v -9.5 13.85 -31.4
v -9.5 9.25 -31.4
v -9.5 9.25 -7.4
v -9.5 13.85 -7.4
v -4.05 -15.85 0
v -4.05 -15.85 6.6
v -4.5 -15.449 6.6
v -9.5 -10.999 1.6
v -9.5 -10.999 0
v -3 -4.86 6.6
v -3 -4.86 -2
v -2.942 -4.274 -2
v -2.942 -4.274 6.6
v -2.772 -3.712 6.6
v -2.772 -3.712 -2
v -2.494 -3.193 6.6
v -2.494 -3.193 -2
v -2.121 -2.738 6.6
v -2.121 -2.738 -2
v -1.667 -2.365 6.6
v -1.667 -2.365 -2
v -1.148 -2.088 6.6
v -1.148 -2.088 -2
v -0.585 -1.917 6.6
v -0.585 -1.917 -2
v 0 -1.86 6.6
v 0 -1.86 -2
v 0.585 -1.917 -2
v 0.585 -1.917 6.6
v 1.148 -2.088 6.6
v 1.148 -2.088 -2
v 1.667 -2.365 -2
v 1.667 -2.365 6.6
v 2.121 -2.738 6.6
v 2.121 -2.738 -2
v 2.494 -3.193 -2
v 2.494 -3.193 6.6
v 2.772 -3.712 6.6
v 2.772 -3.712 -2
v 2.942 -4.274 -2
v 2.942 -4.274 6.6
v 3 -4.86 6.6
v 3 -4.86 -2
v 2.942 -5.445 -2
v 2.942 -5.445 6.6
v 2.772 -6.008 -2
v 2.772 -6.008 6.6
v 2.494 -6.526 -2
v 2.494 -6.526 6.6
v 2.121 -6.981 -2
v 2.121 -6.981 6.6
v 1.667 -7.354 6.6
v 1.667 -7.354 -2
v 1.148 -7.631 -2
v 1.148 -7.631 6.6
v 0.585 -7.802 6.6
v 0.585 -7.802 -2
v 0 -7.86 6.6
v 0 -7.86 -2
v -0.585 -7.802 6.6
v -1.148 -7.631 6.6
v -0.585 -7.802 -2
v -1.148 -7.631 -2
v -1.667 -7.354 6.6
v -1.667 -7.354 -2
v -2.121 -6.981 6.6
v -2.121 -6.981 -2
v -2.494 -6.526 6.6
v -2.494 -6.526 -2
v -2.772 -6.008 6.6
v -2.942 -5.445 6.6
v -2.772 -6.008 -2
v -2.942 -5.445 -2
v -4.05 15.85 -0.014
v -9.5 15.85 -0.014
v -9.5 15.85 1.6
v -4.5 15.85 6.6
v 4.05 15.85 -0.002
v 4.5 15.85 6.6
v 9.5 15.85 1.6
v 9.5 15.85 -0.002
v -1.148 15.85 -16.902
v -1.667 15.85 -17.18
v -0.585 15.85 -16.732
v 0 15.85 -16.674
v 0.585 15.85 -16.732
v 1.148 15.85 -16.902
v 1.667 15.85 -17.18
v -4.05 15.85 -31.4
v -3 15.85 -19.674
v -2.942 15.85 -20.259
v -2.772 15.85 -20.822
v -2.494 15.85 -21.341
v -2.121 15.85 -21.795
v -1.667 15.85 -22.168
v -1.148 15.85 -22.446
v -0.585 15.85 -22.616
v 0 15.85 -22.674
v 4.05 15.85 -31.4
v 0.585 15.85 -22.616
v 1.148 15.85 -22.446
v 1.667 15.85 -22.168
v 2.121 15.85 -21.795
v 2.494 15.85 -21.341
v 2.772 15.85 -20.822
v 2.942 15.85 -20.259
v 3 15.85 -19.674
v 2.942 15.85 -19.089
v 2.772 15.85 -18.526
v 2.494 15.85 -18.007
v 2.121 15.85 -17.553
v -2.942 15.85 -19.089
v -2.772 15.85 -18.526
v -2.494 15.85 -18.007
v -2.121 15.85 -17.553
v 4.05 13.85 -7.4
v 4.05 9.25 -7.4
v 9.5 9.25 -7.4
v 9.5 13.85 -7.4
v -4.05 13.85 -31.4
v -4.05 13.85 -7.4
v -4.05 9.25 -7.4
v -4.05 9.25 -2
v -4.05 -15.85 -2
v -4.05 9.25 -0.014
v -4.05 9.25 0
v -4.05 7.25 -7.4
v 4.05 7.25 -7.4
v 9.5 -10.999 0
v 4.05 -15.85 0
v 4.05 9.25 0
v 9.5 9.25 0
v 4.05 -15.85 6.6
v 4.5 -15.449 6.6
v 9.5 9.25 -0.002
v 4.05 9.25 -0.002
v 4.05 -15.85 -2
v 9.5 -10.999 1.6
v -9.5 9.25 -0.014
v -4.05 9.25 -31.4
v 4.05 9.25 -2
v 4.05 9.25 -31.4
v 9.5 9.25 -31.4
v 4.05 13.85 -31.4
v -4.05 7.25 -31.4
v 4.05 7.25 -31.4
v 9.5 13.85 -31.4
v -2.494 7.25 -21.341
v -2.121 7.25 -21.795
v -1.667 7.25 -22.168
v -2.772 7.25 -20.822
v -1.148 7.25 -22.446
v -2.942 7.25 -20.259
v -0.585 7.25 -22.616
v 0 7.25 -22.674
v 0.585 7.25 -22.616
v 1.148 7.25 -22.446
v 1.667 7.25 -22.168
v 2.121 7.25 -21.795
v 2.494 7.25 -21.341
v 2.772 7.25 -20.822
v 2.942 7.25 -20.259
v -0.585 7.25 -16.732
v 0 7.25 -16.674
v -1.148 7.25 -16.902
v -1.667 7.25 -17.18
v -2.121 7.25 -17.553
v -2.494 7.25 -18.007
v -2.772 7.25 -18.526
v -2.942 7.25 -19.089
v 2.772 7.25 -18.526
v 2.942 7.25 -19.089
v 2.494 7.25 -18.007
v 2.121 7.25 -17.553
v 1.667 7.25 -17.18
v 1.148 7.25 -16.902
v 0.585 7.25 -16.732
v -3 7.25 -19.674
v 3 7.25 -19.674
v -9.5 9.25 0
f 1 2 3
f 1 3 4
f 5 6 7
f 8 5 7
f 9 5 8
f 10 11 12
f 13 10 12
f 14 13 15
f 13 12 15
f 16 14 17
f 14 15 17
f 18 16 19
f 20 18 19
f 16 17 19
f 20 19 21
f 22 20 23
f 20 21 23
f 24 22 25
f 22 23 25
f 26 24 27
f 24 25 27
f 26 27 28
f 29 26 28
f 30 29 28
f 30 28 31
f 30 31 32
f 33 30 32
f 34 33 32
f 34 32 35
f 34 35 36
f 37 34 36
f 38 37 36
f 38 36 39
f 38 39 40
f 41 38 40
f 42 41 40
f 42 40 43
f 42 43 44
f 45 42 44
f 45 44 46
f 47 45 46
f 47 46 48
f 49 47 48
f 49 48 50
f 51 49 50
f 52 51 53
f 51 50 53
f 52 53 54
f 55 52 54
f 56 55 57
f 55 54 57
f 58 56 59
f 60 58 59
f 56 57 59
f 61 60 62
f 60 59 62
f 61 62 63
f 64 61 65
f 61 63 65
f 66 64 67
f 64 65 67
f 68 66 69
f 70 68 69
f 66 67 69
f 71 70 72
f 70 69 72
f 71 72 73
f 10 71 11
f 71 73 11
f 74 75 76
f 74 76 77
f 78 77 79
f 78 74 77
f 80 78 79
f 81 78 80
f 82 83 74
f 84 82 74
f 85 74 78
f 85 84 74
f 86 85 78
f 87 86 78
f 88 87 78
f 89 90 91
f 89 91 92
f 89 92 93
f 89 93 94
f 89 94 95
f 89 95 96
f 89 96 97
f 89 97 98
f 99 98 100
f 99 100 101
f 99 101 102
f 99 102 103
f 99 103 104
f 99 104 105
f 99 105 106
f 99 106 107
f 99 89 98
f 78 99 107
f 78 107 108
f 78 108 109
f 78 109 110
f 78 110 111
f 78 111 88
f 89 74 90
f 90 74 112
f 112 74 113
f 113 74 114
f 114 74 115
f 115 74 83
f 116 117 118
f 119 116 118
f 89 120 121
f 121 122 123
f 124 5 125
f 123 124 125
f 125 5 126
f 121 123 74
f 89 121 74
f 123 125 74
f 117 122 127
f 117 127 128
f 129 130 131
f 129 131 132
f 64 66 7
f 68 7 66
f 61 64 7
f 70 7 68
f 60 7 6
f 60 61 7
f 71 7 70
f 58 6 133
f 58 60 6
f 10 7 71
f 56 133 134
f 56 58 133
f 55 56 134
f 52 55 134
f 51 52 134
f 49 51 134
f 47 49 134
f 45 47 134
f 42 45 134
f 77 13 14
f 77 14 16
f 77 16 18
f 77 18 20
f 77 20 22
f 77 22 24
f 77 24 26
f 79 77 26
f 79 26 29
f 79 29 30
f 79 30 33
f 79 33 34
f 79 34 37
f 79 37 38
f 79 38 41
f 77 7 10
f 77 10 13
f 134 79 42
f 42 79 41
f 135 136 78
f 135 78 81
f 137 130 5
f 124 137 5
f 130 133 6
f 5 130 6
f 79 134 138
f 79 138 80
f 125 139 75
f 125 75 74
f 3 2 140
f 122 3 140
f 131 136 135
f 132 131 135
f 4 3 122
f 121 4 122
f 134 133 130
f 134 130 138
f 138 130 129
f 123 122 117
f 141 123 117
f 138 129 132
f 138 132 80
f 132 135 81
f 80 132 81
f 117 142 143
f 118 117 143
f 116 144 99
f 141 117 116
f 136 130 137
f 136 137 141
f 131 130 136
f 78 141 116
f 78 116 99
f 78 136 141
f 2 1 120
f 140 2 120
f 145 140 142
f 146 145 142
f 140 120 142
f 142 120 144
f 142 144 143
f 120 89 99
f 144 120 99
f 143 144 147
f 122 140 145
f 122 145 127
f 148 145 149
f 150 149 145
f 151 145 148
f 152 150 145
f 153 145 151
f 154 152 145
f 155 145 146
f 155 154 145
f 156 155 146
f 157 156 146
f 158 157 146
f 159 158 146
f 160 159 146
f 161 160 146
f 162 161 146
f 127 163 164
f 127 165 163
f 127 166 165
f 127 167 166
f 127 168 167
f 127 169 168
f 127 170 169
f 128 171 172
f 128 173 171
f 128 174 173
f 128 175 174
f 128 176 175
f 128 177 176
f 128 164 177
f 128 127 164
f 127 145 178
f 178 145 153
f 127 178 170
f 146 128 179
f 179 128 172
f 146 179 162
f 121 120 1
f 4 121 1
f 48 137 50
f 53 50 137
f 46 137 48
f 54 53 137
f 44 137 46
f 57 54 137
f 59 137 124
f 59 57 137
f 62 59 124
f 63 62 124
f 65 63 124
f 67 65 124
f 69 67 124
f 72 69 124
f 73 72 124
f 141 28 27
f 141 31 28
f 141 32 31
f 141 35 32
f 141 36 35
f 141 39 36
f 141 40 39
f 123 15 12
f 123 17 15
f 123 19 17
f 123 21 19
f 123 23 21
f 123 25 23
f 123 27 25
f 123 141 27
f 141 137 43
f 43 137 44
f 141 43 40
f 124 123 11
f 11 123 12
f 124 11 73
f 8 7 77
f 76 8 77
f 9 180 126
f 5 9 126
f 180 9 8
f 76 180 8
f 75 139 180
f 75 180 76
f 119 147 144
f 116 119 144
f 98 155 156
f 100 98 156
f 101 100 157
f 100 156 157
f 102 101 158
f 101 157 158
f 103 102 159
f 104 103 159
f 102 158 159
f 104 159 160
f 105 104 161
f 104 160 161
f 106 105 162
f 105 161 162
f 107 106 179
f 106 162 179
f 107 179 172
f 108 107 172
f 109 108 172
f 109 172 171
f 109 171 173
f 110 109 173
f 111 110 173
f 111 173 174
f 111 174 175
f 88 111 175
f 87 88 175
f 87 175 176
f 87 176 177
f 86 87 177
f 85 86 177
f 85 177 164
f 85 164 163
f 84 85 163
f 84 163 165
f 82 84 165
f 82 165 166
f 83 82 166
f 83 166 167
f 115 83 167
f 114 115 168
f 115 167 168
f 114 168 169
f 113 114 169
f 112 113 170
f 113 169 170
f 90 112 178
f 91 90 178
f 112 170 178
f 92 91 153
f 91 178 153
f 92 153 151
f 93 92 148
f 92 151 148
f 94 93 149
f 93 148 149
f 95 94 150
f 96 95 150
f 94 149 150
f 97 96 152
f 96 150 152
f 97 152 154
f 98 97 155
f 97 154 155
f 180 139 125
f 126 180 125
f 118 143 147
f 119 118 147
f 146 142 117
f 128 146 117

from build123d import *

# Parameters (mm, degrees)
SKETCH_2_W          = 19
SKETCH_2_H          = 31.7
EXTRUDE_1_DEPTH     = 6.6
SKETCH_3_W          = 19
SKETCH_3_H          = 38
EXTRUDE_2_DEPTH     = 6.6
SKETCH_4_W          = 8.1
SKETCH_4_H          = 25.10428036
EXTRUDE_3_DEPTH     = 2
SKETCH_5_W          = 8.1
SKETCH_5_H          = 24
EXTRUDE_4_DEPTH     = 2
SKETCH_6_W          = 5.45
SKETCH_6_H          = 7.386023797
SKETCH_6_H_2        = 7.397863342
CUT_EXTRUDE_1_DEPTH = 42.306415967
CHAMFER_1_SIZE      = 5
SKETCH_7_R          = 3
CUT_EXTRUDE_2_DEPTH = 35.725098992
SKETCH_8_R          = 3
CUT_EXTRUDE_3_DEPTH = 41.122562231
SKETCH_9_W          = 5.45
SKETCH_9_H          = 2
CUT_EXTRUDE_4_DEPTH = 25
CUT_EXTRUDE_5_DEPTH = 35.725098992


with BuildPart() as part:
    # 草图2 → 凸台-拉伸1 (new body)
    with BuildSketch(Plane.XY):
        Rectangle(SKETCH_2_W, SKETCH_2_H)
    extrude(amount=EXTRUDE_1_DEPTH)

    # 草图3 → 凸台-拉伸2 (add)
    with BuildSketch(Plane(origin=(0, 15.85, 0), x_dir=(1, 0, 0), z_dir=(0, 1, 0))):
        with Locations((0, 12.4)):
            Rectangle(SKETCH_3_W, SKETCH_3_H)
    extrude(amount=-EXTRUDE_2_DEPTH)

    # 草图4 → 凸台-拉伸3 (add)
    with BuildSketch(Plane(origin=(0, 0, 0), x_dir=(-1, 0, 0), z_dir=(0, 0, -1))):
        with Locations((0, -3.29785982)):
            Rectangle(SKETCH_4_W, SKETCH_4_H)
    extrude(amount=EXTRUDE_3_DEPTH)

    # 草图5 → 凸台-拉伸4 (add)
    with BuildSketch(Plane.XZ.offset(-9.25)):
        with Locations((0, -19.4)):
            Rectangle(SKETCH_5_W, SKETCH_5_H)
    extrude(amount=EXTRUDE_4_DEPTH)

    # 草图6 → 切除-拉伸1 (cut, through all)
    with BuildSketch(Plane.XZ.offset(-9.25)):
        with Locations((-6.775, -3.706988102)):
            Rectangle(SKETCH_6_W, SKETCH_6_H)
        with Locations((6.775, -3.701068329)):
            Rectangle(SKETCH_6_W, SKETCH_6_H_2)
    extrude(amount=-CUT_EXTRUDE_1_DEPTH, mode=Mode.SUBTRACT)

    # 倒角1
    chamfer_1_edges = [part.edges().sort_by_distance(p)[0] for p in [
        (-9.5, 0, 6.6),
        (9.5, 0, 6.6),
    ]]
    chamfer(chamfer_1_edges, length=CHAMFER_1_SIZE)

    # 草图7 → 切除-拉伸2 (cut, through all)
    with BuildSketch(Plane(origin=(0, 0, -2), x_dir=(-1, 0, 0), z_dir=(0, 0, -1))):
        with Locations((0, -4.859710354)):
            Circle(SKETCH_7_R)
    extrude(amount=-CUT_EXTRUDE_2_DEPTH, mode=Mode.SUBTRACT)

    # 草图8 → 切除-拉伸3 (cut, through all)
    with BuildSketch(Plane.XZ.offset(-7.25)):
        with Locations(Location((0, -19.674028048, 0), (0, 0, 270))):
            Circle(SKETCH_8_R)
    extrude(amount=-CUT_EXTRUDE_3_DEPTH, mode=Mode.SUBTRACT)

    # 草图9 → 切除-拉伸4 (cut)
    with BuildSketch(Plane(origin=(0, 0, -31.4), x_dir=(-1, 0, 0), z_dir=(0, 0, -1))):
        with Locations((-6.775, 14.85)):
            Rectangle(SKETCH_9_W, SKETCH_9_H)
        with Locations((6.775, 14.85)):
            Rectangle(SKETCH_9_W, SKETCH_9_H)
    extrude(amount=-CUT_EXTRUDE_4_DEPTH, mode=Mode.SUBTRACT)

    # 草图10 → 切除-拉伸5 (cut, through all)
    with BuildSketch(Plane(origin=(0, 0, -2), x_dir=(-1, 0, 0), z_dir=(0, 0, -1))):
        Polygon((-4.05, -15.85), (-9.5, -10.999261641), (-9.5, -15.85), align=None)
    cut_extrude_5 = extrude(amount=-CUT_EXTRUDE_5_DEPTH, mode=Mode.SUBTRACT)

    # 镜向1: 切除-拉伸5 across plane
    add(cut_extrude_5.mirror(Plane(origin=(0, 0, 0), x_dir=(0, 0, 1), z_dir=(1, 0, 0))), mode=Mode.SUBTRACT)


solid = part.part
